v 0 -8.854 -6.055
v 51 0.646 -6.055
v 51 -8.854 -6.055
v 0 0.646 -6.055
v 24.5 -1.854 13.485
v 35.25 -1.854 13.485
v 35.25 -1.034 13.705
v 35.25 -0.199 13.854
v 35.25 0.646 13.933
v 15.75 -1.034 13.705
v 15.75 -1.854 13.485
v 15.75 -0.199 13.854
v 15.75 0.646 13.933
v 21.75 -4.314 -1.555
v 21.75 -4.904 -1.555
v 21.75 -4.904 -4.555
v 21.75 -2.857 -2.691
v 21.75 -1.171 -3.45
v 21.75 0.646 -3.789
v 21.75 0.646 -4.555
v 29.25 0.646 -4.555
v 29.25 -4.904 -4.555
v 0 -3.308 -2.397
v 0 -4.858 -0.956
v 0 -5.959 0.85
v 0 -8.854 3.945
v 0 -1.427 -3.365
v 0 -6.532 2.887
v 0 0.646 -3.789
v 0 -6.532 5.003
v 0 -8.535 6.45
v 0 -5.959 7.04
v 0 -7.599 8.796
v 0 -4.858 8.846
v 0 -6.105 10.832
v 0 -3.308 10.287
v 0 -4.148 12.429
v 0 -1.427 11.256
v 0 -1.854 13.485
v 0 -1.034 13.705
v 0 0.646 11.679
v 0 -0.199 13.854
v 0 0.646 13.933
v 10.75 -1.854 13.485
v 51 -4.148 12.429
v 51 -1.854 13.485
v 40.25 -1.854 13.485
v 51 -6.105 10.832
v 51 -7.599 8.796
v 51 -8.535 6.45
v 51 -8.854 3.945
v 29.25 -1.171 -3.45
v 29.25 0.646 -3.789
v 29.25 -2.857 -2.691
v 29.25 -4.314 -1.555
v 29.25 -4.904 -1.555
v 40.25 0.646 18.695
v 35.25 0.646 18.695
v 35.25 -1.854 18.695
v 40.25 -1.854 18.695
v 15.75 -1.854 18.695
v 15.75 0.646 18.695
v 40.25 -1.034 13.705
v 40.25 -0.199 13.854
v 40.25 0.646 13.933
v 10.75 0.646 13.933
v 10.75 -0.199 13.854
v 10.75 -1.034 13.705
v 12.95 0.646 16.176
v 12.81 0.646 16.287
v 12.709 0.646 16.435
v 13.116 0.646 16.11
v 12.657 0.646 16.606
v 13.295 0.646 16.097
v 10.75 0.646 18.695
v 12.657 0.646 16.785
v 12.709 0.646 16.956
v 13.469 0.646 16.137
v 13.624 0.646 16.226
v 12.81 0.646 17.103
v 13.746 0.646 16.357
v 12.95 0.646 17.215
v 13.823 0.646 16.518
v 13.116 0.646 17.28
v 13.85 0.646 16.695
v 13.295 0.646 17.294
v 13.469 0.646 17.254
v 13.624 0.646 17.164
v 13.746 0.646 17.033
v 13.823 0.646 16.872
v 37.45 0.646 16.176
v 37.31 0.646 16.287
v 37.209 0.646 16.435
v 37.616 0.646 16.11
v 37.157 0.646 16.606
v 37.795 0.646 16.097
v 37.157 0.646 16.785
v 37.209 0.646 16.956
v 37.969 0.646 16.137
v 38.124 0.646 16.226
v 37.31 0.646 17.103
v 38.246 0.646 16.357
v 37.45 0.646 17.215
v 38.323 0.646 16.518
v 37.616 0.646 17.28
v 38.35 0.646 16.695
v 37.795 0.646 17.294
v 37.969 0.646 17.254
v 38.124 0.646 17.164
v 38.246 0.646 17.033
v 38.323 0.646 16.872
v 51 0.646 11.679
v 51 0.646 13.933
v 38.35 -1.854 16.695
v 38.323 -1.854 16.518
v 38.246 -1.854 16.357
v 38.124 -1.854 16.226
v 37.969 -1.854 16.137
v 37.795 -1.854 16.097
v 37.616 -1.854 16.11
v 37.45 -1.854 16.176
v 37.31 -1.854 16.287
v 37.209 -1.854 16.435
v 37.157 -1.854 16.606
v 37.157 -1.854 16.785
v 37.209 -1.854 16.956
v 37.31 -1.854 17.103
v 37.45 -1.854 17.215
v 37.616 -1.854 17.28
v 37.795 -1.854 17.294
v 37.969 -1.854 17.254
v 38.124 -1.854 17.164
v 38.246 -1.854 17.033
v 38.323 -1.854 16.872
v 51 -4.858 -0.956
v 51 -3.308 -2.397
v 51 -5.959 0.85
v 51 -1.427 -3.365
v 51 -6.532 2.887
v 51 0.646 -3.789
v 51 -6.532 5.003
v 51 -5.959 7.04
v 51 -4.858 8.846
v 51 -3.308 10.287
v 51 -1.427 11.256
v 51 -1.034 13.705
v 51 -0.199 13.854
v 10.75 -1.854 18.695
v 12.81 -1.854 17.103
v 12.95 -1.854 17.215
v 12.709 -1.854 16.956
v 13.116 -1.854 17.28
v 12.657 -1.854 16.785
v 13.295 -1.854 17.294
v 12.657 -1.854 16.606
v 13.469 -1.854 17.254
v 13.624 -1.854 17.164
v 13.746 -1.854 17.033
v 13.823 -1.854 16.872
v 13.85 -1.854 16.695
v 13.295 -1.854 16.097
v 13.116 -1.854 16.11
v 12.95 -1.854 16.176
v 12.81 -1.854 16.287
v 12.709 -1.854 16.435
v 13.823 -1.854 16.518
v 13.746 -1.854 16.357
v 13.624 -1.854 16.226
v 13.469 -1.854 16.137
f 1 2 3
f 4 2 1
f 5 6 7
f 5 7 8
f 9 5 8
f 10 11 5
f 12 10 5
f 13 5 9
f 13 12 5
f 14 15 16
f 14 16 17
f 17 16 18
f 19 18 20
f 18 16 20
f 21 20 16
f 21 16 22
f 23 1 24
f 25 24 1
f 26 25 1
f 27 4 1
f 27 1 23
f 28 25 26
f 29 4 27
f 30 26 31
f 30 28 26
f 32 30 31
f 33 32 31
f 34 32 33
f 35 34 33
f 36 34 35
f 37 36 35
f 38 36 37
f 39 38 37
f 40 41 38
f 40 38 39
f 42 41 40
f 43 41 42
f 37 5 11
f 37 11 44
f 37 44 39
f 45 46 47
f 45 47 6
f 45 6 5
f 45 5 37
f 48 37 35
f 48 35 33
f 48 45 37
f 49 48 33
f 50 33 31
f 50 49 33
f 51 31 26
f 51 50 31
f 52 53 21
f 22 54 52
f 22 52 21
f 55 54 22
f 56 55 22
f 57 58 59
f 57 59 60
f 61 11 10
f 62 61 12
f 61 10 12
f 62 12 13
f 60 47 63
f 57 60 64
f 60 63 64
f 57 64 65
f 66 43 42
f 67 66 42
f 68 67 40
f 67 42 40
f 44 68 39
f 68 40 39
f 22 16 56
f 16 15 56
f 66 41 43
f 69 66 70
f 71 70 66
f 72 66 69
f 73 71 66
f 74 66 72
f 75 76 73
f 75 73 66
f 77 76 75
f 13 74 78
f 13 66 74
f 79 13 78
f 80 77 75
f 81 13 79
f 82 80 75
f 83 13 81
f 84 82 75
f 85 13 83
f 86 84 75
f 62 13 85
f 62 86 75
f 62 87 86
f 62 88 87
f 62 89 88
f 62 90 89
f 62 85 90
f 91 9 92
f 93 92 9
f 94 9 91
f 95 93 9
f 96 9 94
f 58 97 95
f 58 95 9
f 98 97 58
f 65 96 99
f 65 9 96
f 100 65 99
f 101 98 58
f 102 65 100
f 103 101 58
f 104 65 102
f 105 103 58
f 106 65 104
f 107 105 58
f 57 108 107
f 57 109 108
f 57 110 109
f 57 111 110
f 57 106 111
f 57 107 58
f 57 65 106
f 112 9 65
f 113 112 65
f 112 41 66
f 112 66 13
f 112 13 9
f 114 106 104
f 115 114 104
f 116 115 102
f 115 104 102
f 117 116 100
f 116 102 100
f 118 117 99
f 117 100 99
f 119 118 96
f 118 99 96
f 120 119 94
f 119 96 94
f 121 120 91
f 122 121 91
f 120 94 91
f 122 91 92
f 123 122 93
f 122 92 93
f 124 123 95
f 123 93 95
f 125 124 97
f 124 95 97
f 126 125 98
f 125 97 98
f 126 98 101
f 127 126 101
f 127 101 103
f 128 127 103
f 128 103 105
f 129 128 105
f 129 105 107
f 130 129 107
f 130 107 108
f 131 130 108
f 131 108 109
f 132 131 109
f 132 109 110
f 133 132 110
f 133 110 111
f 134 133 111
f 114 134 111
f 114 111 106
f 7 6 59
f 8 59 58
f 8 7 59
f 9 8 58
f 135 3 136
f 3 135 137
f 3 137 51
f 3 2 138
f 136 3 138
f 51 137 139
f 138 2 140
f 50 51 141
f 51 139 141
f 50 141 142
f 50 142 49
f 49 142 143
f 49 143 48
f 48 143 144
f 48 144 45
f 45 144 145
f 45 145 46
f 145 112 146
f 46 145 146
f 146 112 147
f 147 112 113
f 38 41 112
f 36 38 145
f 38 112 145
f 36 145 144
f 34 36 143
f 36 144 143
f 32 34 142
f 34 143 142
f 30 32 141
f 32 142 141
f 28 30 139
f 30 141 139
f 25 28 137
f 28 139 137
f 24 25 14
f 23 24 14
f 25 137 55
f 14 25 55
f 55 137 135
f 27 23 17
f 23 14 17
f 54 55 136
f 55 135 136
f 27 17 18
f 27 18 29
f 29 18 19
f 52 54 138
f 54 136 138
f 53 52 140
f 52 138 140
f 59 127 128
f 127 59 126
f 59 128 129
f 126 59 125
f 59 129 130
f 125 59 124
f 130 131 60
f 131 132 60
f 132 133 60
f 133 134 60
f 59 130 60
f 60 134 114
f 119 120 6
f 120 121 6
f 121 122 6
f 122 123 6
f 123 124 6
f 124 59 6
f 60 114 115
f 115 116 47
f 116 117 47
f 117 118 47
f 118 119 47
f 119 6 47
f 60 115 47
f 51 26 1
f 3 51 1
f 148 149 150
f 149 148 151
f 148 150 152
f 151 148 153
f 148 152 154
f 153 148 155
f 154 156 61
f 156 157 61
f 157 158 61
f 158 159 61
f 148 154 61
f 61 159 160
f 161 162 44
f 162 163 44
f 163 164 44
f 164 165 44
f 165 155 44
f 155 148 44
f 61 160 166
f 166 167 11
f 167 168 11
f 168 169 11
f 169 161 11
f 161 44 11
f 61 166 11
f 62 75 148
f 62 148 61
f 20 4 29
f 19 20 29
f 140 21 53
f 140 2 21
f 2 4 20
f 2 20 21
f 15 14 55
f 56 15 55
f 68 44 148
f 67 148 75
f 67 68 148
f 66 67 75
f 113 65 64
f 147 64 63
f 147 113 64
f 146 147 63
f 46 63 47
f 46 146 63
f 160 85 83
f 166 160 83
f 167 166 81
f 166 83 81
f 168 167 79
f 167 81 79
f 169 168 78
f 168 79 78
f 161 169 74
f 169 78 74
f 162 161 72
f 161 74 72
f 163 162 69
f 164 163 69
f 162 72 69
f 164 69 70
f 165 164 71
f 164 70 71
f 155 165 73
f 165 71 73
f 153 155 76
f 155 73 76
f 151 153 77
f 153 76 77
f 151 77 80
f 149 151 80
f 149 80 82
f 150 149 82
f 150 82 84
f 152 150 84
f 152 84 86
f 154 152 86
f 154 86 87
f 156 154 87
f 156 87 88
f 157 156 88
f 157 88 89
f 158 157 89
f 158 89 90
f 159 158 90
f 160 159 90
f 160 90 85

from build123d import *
from build123d.topology import SkipClean

# Parameters (mm, degrees)
SKETCH1_W                = 34
SKETCH1_H                = 30
BOSS_EXTRUDE2_DEPTH      = 51
SKETCH3_R                = 2.55
CUT_EXTRUDE3_DEPTH       = 10
SKETCH5_R                = 7.75
CUT_EXTRUDE4_DEPTH       = 51
SKETCH6_W                = 7
SKETCH6_H                = 30
CUT_EXTRUDE6_DEPTH       = 51
CUT_EXTRUDE7_DEPTH       = 51
CUT_EXTRUDE9_DEPTH       = 1.5
CUT_EXTRUDE9_DEPTH_BACK  = 1.5
BOSS_EXTRUDE5_DEPTH      = 51
CUT_EXTRUDE10_DEPTH      = 13
CUT_EXTRUDE11_START      = -13
CUT_EXTRUDE11_DEPTH      = 13
SKETCH13_W               = 2
SKETCH13_H               = 6
CUT_EXTRUDE12_DEPTH      = 2
CUT_EXTRUDE13_DEPTH      = 13
CUT_EXTRUDE13_DEPTH_BACK = 11
BOSS_EXTRUDE6_DEPTH      = 2.25
BOSS_EXTRUDE7_DEPTH      = 2.25
BOSS_EXTRUDE8_DEPTH      = 2.25
BOSS_EXTRUDE9_DEPTH      = 2.25
SKETCH22_W               = 5
SKETCH22_H               = 6
BOSS_EXTRUDE10_DEPTH     = 1
SKETCH24_W               = 5
SKETCH24_H               = 6
BOSS_EXTRUDE11_DEPTH     = 1
SKETCH25_R               = 0.6
CUT_EXTRUDE14_DEPTH      = 20
SKETCH26_R               = 2.55
BOSS_EXTRUDE12_DEPTH     = 1.5
CUT_EXTRUDE16_DEPTH      = 60


with BuildPart() as part:
    # Sketch1 → Boss-Extrude2 (new body)
    with BuildSketch(Plane(origin=(0, 0, 0), x_dir=(0, 0, -1), z_dir=(1, 0, 0))):
        with Locations((-3.945183177, 6.145902028)):
            Rectangle(SKETCH1_W, SKETCH1_H)
    extrude(amount=BOSS_EXTRUDE2_DEPTH)

    # Sketch3 → Cut-Extrude3 (cut)
    with BuildSketch(Plane(origin=(0, 0, -13.054816823), x_dir=(-1, 0, 0), z_dir=(0, 0, -1))):
        with Locations((-25.5, -1.354097972)):
            Circle(SKETCH3_R)
    extrude(amount=-CUT_EXTRUDE3_DEPTH, mode=Mode.SUBTRACT)

    # Sketch5 → Cut-Extrude4 (cut)
    with BuildSketch(Plane(origin=(51, 0, 0), x_dir=(0, 0, -1), z_dir=(1, 0, 0))):
        with Locations((-3.945183177, 1.145902028)):
            Circle(SKETCH5_R)
    extrude(amount=-CUT_EXTRUDE4_DEPTH, mode=Mode.SUBTRACT)

    # Sketch6 → Cut-Extrude6 (cut)
    with BuildSketch(Plane(origin=(51, 0, 0), x_dir=(0, 0, -1), z_dir=(1, 0, 0))):
        with Locations((9.554816823, 6.145902028)):
            Rectangle(SKETCH6_W, SKETCH6_H)
    extrude(amount=-CUT_EXTRUDE6_DEPTH, mode=Mode.SUBTRACT)

    # Sketch7 → Cut-Extrude7 (cut)
    with BuildSketch(Plane(origin=(51, 0, 0), x_dir=(0, 0, -1), z_dir=(1, 0, 0))):
        with BuildLine():
            Line((-3.945183177, -8.854097972), (-20.945183177, -8.854097972))
            Line((-20.945183177, -8.854097972), (-20.945183177, 21.145902028))
            Line((-20.945183177, 21.145902028), (6.054816823, 21.145902028))
            Line((6.054816823, 21.145902028), (6.054816823, 1.145902028))
            ThreePointArc((6.054816823, 1.145902028), (-11.016250989, 8.21696984), (-3.945183177, -8.854097972))
        make_face()
    extrude(amount=-CUT_EXTRUDE7_DEPTH, mode=Mode.SUBTRACT)

    # Sketch8 → Cut-Extrude9 (cut, two sides: drawn at the far end of the back side and taken through both)
    with BuildSketch(Plane(origin=(0, 0, -3.054816823), x_dir=(-1, 0, 0), z_dir=(0, 0, -1)).offset(-CUT_EXTRUDE9_DEPTH_BACK)):
        Polygon((-21.75, -2.180131646), (-21.75, -4.904097972), (-29.25, -4.904097972), (-29.25, -2.180131646), (-29.25, 2.195902028), (-21.75, 2.195902028), align=None)
    extrude(amount=CUT_EXTRUDE9_DEPTH + CUT_EXTRUDE9_DEPTH_BACK, mode=Mode.SUBTRACT)

    # Sketch10 → Boss-Extrude5 (add)
    with BuildSketch(Plane(origin=(51, 0, 0), x_dir=(0, 0, -1), z_dir=(1, 0, 0))):
        Polygon((-17.695183177, 1.145902028), (-17.695183177, 4.145902028), (-11.695183177, 4.145902028), (-11.695183177, 1.145902028), (-11.695183177, -1.854097972), (-17.695183177, -1.854097972), align=None)
    extrude(amount=-BOSS_EXTRUDE5_DEPTH)

    # Sketch11 → Cut-Extrude10 (cut)
    with BuildSketch(Plane(origin=(51, 0, 0), x_dir=(0, 0, -1), z_dir=(1, 0, 0))):
        with BuildLine():
            Line((-13.484575191, -1.854097972), (-17.695183177, -1.854097972))
            Line((-17.695183177, -1.854097972), (-17.695183177, 4.145902028))
            Line((-17.695183177, 4.145902028), (-13.484575191, 4.145902028))
            ThreePointArc((-13.484575191, 4.145902028), (-13.945183177, 1.145902028), (-13.484575191, -1.854097972))
        make_face()
    extrude(amount=-CUT_EXTRUDE10_DEPTH, mode=Mode.SUBTRACT)

    # Sketch12 → Cut-Extrude11 (cut)
    with BuildSketch(Plane.ZY.offset(CUT_EXTRUDE11_START)):
        with BuildLine():
            Line((13.484575191, -1.854097972), (17.695183177, -1.854097972))
            Line((17.695183177, -1.854097972), (17.695183177, 4.145902028))
            Line((17.695183177, 4.145902028), (13.484575191, 4.145902028))
            ThreePointArc((13.484575191, 4.145902028), (13.945183177, 1.145902028), (13.484575191, -1.854097972))
        make_face()
    extrude(amount=CUT_EXTRUDE11_DEPTH, mode=Mode.SUBTRACT)

    # Sketch13 → Cut-Extrude12 (cut)
    with BuildSketch(Plane.XY.offset(17.695183177)):
        with Locations((25.5, 1.145902028)):
            Rectangle(SKETCH13_W, SKETCH13_H)
    extrude(amount=-CUT_EXTRUDE12_DEPTH, mode=Mode.SUBTRACT)

    # Sketch15 → Cut-Extrude13 (cut, two sides: drawn at the far end of the back side and taken through both)
    with SkipClean():  # the faces are left unmerged after this step: merging them gives an invalid solid
        with BuildSketch(Plane(origin=(24.5, 0, 0), x_dir=(0, 0, -1), z_dir=(1, 0, 0)).offset(-CUT_EXTRUDE13_DEPTH_BACK)):
            with BuildLine():
                Line((-17.695183177, 4.145902028), (-17.695183177, -1.854097972))
                Line((-17.695183177, -1.854097972), (-13.484575191, -1.854097972))
                ThreePointArc((-13.484575191, -1.854097972), (-13.945183177, 1.145902028), (-13.484575191, 4.145902028))
                Line((-13.484575191, 4.145902028), (-17.695183177, 4.145902028))
            make_face()
        extrude(amount=CUT_EXTRUDE13_DEPTH + CUT_EXTRUDE13_DEPTH_BACK, mode=Mode.SUBTRACT)

    # Sketch17 → Boss-Extrude6 (add)
    with SkipClean():  # the faces are left unmerged after this step: merging them gives an invalid solid
        with BuildSketch(Plane(origin=(38, 0, 0), x_dir=(0, 0, -1), z_dir=(1, 0, 0))):
            with BuildLine():
                Line((-13.484575191, 4.145902028), (-17.695183177, 4.145902028))
                Line((-17.695183177, 4.145902028), (-17.695183177, -1.854097972))
                Line((-17.695183177, -1.854097972), (-13.484575191, -1.854097972))
                ThreePointArc((-13.484575191, -1.854097972), (-13.945183177, 1.145902028), (-13.484575191, 4.145902028))
            make_face()
        extrude(amount=BOSS_EXTRUDE6_DEPTH)

    # Sketch19 → Boss-Extrude7 (add)
    with SkipClean():  # the faces are left unmerged after this step: merging them gives an invalid solid
        with BuildSketch(Plane.ZY.offset(-13)):
            with BuildLine():
                Line((13.484575191, 4.145902028), (17.695183177, 4.145902028))
                Line((17.695183177, 4.145902028), (17.695183177, -1.854097972))
                Line((17.695183177, -1.854097972), (13.484575191, -1.854097972))
                ThreePointArc((13.484575191, -1.854097972), (13.945183177, 1.145902028), (13.484575191, 4.145902028))
            make_face()
        extrude(amount=BOSS_EXTRUDE7_DEPTH)

    # Sketch20 → Boss-Extrude8 (add)
    with SkipClean():  # the faces are left unmerged after this step: merging them gives an invalid solid
        with BuildSketch(Plane(origin=(13.5, 0, 0), x_dir=(0, 0, -1), z_dir=(1, 0, 0))):
            with BuildLine():
                Line((-17.695183177, -1.854097972), (-17.695183177, 4.145902028))
                Line((-17.695183177, 4.145902028), (-13.484575191, 4.145902028))
                ThreePointArc((-13.484575191, 4.145902028), (-13.945183177, 1.145902028), (-13.484575191, -1.854097972))
                Line((-13.484575191, -1.854097972), (-17.695183177, -1.854097972))
            make_face()
        extrude(amount=BOSS_EXTRUDE8_DEPTH)

    # Sketch21 → Boss-Extrude9 (add)
    with SkipClean():  # the faces are left unmerged after this step: merging them gives an invalid solid
        with BuildSketch(Plane.ZY.offset(-37.5)):
            with BuildLine():
                Line((13.484575191, 4.145902028), (17.695183177, 4.145902028))
                Line((17.695183177, 4.145902028), (17.695183177, -1.854097972))
                Line((17.695183177, -1.854097972), (13.484575191, -1.854097972))
                ThreePointArc((13.484575191, -1.854097972), (13.945183177, 1.145902028), (13.484575191, 4.145902028))
            make_face()
        extrude(amount=BOSS_EXTRUDE9_DEPTH)

    # Sketch22 → Boss-Extrude10 (add)
    with SkipClean():  # the faces are left unmerged after this step: merging them gives an invalid solid
        with BuildSketch(Plane.XY.offset(17.695183177)):
            with Locations((37.75, 1.145902028)):
                Rectangle(SKETCH22_W, SKETCH22_H)
        extrude(amount=BOSS_EXTRUDE10_DEPTH)

    # Sketch24 → Boss-Extrude11 (add)
    with SkipClean():  # the faces are left unmerged after this step: merging them gives an invalid solid
        with BuildSketch(Plane.XY.offset(17.695183177)):
            with Locations((13.25, 1.145902028)):
                Rectangle(SKETCH24_W, SKETCH24_H)
        extrude(amount=BOSS_EXTRUDE11_DEPTH)

    # Sketch25 → Cut-Extrude14 (cut)
    with SkipClean():  # the faces are left unmerged after this step: merging them gives an invalid solid
        with BuildSketch(Plane(origin=(0, 4.145902028, 0), x_dir=(1, 0, 0), z_dir=(0, 1, 0))):
            with Locations((13.25, -16.695183177)):
                Circle(SKETCH25_R)
            with Locations((37.75, -16.695183177)):
                Circle(SKETCH25_R)
        extrude(amount=-CUT_EXTRUDE14_DEPTH, mode=Mode.SUBTRACT)

    # Sketch26 → Boss-Extrude12 (add)
    with SkipClean():  # the faces are left unmerged after this step: merging them gives an invalid solid
        with BuildSketch(Plane(origin=(0, 0, -6.054816823), x_dir=(-1, 0, 0), z_dir=(0, 0, -1))):
            with Locations((-25.5, -1.354097972)):
                Circle(SKETCH26_R)
        extrude(amount=-BOSS_EXTRUDE12_DEPTH)

    # Sketch27 → Cut-Extrude16 (cut)
    with SkipClean():  # the faces are left unmerged after this step: merging them gives an invalid solid
        with BuildSketch(Plane(origin=(51, 0, 0), x_dir=(0, 0, -1), z_dir=(1, 0, 0))):
            Polygon((-18.695183177, 1.145902028), (-18.695183177, 12.015935401), (6.594766684, 12.015935401), (6.594766684, 1.145902028), (6.594766684, 0.645902028), (-18.695183177, 0.645902028), align=None)
        extrude(amount=-CUT_EXTRUDE16_DEPTH, mode=Mode.SUBTRACT)


solid = part.part
